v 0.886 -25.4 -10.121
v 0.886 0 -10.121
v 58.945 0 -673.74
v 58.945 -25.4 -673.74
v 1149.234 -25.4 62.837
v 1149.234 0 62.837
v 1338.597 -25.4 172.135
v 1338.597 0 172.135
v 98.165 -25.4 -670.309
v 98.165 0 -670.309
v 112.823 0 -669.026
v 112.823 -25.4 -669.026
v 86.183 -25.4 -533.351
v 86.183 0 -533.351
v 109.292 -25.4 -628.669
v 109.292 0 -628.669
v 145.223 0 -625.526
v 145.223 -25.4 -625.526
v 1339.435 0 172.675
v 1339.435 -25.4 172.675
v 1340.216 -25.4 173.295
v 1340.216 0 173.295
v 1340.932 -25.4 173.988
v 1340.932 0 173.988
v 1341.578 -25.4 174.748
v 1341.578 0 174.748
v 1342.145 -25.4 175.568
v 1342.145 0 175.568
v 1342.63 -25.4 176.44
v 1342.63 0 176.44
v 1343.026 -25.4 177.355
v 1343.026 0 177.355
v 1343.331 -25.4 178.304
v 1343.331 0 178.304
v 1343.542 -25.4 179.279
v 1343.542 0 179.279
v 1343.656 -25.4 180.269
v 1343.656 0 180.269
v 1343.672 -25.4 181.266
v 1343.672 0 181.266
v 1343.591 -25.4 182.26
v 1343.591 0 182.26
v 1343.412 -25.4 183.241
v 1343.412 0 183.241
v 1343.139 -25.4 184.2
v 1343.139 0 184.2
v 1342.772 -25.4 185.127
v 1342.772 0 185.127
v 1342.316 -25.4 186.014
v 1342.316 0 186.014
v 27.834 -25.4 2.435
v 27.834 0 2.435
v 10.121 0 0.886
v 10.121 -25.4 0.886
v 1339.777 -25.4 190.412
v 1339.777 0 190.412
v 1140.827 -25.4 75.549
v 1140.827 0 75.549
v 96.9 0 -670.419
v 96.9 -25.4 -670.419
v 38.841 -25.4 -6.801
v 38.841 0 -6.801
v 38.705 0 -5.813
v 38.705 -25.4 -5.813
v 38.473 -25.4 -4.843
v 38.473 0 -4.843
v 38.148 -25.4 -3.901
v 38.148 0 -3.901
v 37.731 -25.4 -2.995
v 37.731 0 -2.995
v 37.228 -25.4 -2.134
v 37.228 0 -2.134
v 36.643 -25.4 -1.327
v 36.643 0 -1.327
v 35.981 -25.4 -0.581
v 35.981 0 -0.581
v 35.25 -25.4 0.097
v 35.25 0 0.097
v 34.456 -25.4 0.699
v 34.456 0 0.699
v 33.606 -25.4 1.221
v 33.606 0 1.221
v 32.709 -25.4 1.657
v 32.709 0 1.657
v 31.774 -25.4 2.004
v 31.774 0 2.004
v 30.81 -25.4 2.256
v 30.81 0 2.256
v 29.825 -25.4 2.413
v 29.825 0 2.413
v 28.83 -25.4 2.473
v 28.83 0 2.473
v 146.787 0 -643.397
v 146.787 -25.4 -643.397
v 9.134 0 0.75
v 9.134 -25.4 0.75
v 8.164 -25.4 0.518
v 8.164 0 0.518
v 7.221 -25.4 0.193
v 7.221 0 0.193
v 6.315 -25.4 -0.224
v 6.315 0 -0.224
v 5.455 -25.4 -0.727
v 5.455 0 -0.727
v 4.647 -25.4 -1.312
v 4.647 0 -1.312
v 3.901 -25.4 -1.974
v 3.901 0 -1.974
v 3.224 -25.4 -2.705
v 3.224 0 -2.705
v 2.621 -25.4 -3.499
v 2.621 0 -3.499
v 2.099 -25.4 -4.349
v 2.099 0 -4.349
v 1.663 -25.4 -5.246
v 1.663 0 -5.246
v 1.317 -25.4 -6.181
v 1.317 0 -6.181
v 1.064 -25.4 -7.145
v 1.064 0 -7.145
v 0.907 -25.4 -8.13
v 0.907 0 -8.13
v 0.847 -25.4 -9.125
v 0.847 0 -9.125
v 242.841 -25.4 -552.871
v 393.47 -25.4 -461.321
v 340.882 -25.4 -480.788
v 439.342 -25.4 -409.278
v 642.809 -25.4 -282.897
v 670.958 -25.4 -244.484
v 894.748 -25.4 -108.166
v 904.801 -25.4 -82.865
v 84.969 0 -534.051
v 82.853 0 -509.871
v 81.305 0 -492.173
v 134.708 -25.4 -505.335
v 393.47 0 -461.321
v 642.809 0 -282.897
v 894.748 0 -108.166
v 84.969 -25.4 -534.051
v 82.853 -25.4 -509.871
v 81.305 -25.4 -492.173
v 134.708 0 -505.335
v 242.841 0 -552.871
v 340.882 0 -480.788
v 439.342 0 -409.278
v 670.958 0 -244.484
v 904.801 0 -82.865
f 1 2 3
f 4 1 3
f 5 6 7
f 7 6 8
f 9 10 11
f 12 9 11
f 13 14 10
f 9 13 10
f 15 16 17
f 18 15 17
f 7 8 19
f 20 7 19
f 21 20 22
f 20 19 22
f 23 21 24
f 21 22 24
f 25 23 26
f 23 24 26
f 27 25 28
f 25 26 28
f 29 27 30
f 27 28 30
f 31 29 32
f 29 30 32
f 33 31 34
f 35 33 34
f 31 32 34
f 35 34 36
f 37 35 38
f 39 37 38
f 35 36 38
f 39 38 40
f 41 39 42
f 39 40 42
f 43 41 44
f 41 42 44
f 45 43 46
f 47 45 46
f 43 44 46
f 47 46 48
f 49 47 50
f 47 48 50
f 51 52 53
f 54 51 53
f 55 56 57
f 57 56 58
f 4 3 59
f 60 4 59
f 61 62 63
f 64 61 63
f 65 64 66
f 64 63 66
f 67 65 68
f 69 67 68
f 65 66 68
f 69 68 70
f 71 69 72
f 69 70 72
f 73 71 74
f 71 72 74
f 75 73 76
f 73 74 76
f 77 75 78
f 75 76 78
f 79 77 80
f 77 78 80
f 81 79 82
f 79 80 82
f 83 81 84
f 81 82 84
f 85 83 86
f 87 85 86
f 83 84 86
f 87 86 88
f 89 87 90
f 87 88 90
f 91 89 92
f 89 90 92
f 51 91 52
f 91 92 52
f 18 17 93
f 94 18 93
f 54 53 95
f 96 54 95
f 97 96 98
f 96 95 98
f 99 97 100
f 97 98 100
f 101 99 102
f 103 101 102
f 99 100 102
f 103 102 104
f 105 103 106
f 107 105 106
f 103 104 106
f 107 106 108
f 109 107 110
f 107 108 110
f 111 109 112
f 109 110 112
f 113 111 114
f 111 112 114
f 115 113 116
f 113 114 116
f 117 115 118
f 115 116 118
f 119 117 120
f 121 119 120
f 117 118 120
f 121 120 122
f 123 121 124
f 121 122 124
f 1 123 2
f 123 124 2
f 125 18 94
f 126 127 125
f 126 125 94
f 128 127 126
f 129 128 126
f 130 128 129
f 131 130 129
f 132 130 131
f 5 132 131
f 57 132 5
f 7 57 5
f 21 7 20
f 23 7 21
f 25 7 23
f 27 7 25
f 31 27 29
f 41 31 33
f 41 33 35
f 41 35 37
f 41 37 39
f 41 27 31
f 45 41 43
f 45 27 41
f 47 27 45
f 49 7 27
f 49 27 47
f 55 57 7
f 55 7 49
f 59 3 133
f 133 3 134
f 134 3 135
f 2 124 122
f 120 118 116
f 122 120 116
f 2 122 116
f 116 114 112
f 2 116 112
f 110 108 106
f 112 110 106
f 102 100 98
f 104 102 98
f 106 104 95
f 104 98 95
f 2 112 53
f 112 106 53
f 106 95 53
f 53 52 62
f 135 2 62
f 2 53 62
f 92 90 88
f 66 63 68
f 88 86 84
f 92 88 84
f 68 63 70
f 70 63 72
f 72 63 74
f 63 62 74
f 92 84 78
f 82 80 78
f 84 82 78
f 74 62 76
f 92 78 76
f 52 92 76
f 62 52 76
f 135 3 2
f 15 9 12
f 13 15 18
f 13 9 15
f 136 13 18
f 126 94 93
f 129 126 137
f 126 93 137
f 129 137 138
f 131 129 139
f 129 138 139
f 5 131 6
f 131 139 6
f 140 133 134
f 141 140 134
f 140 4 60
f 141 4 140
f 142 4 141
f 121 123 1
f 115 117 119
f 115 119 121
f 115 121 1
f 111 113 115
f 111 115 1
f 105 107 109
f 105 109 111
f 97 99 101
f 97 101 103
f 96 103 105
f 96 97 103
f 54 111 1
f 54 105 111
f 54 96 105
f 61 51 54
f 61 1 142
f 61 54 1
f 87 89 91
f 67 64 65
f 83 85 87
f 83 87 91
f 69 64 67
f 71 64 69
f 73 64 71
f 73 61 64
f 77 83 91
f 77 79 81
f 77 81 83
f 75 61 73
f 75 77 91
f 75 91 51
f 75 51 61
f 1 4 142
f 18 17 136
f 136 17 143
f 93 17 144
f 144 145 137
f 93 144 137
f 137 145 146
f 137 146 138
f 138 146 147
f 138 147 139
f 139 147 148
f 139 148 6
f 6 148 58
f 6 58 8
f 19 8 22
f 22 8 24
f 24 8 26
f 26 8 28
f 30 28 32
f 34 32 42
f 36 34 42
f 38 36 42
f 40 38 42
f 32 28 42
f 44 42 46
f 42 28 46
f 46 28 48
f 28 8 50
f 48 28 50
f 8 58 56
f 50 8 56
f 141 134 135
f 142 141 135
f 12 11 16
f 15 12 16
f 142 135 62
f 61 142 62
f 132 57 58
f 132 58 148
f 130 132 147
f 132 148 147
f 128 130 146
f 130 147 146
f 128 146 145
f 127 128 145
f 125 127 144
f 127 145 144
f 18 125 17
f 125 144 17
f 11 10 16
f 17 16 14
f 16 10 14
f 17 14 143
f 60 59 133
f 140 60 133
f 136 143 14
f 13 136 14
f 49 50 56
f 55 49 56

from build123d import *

# Parameters (mm, degrees)
F1_DEPTH = 25.4
F2_DEPTH = 25.4


with BuildPart() as f1:
    # F0 (on Front) → F1 (new body)
    with BuildSketch(Plane.XZ):
        with BuildLine():
            ThreePointArc((10.1213381326, 0.8855023463), (3.2238289368, -2.7051136719), (0.8855023463, -10.1213381326))
            Line((0.8855023463, -10.1213381326), (41.2345650726, -471.3132354613))
            Line((41.2345650726, -471.3132354613), (79.1895830699, -467.9926016626))
            Line((79.1895830699, -467.9926016626), (38.8405203436, -6.8007043339))
            ThreePointArc((38.8405203436, -6.8007043339), (35.2499043254, 0.0968048618), (27.8336798647, 2.4351314524))
            Line((27.8336798647, 2.4351314524), (10.1213381326, 0.8855023463))
        make_face()
        Polygon((79.1895830699, -467.9926016626), (41.2345650726, -471.3132354613), (44.898479083, -513.1919642333), (81.3050601101, -492.1726148771), align=None)
        Polygon((81.3050601101, -492.1726148771), (44.898479083, -513.1919642333), (82.8534970803, -509.8713304346), align=None)
        Polygon((82.8534970803, -509.8713304346), (44.898479083, -513.1919642333), (48.5623930934, -555.0706930054), (84.9689741205, -534.0513436491), align=None)
        Polygon((84.9689741205, -534.0513436491), (48.5623930934, -555.0706930054), (58.9446119989, -673.7399981135), (96.8996299962, -670.4193643148), align=None)
    extrude(amount=F1_DEPTH)


with BuildPart() as f1b:
    # F0 (on Front) → F1, piece 2 (new body)
    with BuildSketch(Plane.XZ):
        Polygon((134.7077027568, -505.3346752818), (86.1825268214, -533.3506986706), (98.1647972628, -670.3086765215), (112.8230853019, -669.0262424914), (109.2922927485, -628.669098936), (145.2230431193, -625.5255656066), align=None)
    extrude(amount=F1_DEPTH)


with BuildPart() as f2:
    # F0 (on Front) → F2 (new body)
    with BuildSketch(Plane.XZ):
        with BuildLine():
            ThreePointArc((439.3423579598, -409.2780954849), (291.8090295293, -516.7575881279), (145.2230431193, -625.5255656065))
            Line((145.2230431193, -625.5255656065), (146.7865641876, -643.3966931935))
            ThreePointArc((146.7865641876, -643.3966931935), (642.809083417, -282.897416364), (1149.2336477768, 62.8369163109))
            Line((1149.2336477769, 62.8369163109), (1338.5965837165, 172.1346969222))
            ThreePointArc((1338.5965837165, 172.1346969222), (1343.3313079414, 178.3039346931), (1342.3164809091, 186.0141379494))
            Line((1342.3164809091, 186.0141379494), (1339.7771039383, 190.4124678825))
            Line((1339.7771039383, 190.4124678825), (1326.0289506532, 182.4749678825))
            Line((1326.0289506532, 182.4749678825), (1154.5752996996, 83.4861563509))
            Line((1154.5752996996, 83.4861563509), (1140.8271464145, 75.5486563509))
            ThreePointArc((1140.8271464145, 75.5486563509), (787.6039445937, -163.2752955443), (439.3423579598, -409.2780954849))
        make_face()
    extrude(amount=F2_DEPTH)


solid = Compound([f1.part, f1b.part, f2.part])
